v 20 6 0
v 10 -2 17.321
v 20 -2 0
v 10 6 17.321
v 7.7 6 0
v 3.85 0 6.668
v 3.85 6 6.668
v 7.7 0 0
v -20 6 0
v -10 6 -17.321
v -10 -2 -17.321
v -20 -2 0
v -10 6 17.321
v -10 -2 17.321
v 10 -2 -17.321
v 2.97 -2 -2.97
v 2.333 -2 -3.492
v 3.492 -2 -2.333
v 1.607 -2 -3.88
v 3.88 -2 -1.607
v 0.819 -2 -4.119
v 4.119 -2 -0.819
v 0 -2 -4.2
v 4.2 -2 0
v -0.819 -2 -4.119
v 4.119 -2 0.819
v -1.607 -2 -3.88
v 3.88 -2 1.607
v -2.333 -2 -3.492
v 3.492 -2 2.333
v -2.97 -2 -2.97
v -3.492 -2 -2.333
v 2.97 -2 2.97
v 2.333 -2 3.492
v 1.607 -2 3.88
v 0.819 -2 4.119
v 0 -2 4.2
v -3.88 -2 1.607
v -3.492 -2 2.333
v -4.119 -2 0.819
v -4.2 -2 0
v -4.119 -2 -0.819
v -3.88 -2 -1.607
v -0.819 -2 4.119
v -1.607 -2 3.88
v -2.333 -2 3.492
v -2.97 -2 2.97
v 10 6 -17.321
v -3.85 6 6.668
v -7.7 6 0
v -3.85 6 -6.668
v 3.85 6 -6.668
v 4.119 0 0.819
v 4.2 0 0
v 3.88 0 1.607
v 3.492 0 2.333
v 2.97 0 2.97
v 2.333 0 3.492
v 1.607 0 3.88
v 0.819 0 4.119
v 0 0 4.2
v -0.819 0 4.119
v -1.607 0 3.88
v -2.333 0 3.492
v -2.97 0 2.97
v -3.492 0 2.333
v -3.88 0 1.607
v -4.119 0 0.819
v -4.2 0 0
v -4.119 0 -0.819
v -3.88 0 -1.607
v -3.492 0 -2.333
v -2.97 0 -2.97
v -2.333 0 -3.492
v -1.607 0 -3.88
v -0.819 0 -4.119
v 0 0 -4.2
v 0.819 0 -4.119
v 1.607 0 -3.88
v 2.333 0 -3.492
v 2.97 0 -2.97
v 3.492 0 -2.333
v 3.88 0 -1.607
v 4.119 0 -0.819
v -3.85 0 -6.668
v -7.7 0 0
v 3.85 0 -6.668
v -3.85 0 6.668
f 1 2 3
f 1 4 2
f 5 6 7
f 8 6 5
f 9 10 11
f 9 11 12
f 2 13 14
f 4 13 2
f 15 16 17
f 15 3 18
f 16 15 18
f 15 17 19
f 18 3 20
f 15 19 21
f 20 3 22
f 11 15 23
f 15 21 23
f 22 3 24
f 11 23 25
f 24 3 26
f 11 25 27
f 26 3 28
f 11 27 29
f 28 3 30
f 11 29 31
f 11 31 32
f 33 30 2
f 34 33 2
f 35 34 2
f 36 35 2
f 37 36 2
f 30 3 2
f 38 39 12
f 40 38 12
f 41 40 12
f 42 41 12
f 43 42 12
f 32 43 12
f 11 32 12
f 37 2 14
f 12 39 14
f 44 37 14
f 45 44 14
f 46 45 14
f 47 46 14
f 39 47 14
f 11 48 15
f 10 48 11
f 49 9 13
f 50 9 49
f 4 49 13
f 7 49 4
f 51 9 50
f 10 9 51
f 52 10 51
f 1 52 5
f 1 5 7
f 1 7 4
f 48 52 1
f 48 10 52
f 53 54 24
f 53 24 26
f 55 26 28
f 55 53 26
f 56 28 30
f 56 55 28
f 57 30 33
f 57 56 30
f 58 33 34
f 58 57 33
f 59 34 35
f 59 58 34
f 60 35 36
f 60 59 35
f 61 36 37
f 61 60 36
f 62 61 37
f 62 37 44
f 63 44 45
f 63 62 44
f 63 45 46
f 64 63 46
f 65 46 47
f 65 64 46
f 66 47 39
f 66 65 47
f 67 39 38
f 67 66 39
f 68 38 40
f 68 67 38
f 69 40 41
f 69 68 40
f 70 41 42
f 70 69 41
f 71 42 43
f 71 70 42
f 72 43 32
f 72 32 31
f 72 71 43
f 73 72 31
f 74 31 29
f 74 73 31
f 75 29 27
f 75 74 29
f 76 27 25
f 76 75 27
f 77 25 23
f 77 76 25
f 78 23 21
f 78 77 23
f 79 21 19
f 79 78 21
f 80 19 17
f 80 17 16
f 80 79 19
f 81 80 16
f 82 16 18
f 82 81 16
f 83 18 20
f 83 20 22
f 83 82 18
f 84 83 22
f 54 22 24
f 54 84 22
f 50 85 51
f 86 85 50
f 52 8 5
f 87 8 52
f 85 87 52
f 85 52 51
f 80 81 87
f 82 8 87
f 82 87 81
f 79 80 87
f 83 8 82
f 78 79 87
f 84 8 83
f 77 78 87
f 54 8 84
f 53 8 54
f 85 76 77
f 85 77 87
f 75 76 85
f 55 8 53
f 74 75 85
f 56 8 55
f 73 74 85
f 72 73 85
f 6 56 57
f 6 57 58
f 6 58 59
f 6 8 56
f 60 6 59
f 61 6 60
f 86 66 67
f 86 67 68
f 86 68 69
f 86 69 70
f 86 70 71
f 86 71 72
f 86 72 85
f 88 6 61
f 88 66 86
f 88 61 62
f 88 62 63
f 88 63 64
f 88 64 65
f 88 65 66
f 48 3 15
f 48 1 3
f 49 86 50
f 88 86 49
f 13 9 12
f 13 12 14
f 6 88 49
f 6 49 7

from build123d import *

# Parameters (mm, degrees)
BOSS_EXTRUDE1_DEPTH = 6
SKETCH2_R           = 4.2
BOSS_EXTRUDE2_DEPTH = 2


with BuildPart() as part:
    # Sketch1 → Boss-Extrude1 (new body)
    with BuildSketch(Plane(origin=(0, 0, 0), x_dir=(1, 0, 0), z_dir=(0, 1, 0))):
        Polygon((-10, 17.320508076), (-20, 0), (-10, -17.320508076), (10, -17.320508076), (20, 0), (10, 17.320508076), align=None)
        Polygon((-3.85, 6.668395609), (-7.7, 0), (-3.85, -6.668395609), (3.85, -6.668395609), (7.7, 0), (3.85, 6.668395609), align=None, mode=Mode.SUBTRACT)
    extrude(amount=BOSS_EXTRUDE1_DEPTH)

    # Sketch2 → Boss-Extrude2 (add)
    with BuildSketch(Plane.XZ):
        Polygon((20, 0), (10, -17.320508076), (-10, -17.320508076), (-20, 0), (-10, 17.320508076), (10, 17.320508076), align=None)
        Circle(SKETCH2_R, mode=Mode.SUBTRACT)
    extrude(amount=BOSS_EXTRUDE2_DEPTH)


solid = part.part
